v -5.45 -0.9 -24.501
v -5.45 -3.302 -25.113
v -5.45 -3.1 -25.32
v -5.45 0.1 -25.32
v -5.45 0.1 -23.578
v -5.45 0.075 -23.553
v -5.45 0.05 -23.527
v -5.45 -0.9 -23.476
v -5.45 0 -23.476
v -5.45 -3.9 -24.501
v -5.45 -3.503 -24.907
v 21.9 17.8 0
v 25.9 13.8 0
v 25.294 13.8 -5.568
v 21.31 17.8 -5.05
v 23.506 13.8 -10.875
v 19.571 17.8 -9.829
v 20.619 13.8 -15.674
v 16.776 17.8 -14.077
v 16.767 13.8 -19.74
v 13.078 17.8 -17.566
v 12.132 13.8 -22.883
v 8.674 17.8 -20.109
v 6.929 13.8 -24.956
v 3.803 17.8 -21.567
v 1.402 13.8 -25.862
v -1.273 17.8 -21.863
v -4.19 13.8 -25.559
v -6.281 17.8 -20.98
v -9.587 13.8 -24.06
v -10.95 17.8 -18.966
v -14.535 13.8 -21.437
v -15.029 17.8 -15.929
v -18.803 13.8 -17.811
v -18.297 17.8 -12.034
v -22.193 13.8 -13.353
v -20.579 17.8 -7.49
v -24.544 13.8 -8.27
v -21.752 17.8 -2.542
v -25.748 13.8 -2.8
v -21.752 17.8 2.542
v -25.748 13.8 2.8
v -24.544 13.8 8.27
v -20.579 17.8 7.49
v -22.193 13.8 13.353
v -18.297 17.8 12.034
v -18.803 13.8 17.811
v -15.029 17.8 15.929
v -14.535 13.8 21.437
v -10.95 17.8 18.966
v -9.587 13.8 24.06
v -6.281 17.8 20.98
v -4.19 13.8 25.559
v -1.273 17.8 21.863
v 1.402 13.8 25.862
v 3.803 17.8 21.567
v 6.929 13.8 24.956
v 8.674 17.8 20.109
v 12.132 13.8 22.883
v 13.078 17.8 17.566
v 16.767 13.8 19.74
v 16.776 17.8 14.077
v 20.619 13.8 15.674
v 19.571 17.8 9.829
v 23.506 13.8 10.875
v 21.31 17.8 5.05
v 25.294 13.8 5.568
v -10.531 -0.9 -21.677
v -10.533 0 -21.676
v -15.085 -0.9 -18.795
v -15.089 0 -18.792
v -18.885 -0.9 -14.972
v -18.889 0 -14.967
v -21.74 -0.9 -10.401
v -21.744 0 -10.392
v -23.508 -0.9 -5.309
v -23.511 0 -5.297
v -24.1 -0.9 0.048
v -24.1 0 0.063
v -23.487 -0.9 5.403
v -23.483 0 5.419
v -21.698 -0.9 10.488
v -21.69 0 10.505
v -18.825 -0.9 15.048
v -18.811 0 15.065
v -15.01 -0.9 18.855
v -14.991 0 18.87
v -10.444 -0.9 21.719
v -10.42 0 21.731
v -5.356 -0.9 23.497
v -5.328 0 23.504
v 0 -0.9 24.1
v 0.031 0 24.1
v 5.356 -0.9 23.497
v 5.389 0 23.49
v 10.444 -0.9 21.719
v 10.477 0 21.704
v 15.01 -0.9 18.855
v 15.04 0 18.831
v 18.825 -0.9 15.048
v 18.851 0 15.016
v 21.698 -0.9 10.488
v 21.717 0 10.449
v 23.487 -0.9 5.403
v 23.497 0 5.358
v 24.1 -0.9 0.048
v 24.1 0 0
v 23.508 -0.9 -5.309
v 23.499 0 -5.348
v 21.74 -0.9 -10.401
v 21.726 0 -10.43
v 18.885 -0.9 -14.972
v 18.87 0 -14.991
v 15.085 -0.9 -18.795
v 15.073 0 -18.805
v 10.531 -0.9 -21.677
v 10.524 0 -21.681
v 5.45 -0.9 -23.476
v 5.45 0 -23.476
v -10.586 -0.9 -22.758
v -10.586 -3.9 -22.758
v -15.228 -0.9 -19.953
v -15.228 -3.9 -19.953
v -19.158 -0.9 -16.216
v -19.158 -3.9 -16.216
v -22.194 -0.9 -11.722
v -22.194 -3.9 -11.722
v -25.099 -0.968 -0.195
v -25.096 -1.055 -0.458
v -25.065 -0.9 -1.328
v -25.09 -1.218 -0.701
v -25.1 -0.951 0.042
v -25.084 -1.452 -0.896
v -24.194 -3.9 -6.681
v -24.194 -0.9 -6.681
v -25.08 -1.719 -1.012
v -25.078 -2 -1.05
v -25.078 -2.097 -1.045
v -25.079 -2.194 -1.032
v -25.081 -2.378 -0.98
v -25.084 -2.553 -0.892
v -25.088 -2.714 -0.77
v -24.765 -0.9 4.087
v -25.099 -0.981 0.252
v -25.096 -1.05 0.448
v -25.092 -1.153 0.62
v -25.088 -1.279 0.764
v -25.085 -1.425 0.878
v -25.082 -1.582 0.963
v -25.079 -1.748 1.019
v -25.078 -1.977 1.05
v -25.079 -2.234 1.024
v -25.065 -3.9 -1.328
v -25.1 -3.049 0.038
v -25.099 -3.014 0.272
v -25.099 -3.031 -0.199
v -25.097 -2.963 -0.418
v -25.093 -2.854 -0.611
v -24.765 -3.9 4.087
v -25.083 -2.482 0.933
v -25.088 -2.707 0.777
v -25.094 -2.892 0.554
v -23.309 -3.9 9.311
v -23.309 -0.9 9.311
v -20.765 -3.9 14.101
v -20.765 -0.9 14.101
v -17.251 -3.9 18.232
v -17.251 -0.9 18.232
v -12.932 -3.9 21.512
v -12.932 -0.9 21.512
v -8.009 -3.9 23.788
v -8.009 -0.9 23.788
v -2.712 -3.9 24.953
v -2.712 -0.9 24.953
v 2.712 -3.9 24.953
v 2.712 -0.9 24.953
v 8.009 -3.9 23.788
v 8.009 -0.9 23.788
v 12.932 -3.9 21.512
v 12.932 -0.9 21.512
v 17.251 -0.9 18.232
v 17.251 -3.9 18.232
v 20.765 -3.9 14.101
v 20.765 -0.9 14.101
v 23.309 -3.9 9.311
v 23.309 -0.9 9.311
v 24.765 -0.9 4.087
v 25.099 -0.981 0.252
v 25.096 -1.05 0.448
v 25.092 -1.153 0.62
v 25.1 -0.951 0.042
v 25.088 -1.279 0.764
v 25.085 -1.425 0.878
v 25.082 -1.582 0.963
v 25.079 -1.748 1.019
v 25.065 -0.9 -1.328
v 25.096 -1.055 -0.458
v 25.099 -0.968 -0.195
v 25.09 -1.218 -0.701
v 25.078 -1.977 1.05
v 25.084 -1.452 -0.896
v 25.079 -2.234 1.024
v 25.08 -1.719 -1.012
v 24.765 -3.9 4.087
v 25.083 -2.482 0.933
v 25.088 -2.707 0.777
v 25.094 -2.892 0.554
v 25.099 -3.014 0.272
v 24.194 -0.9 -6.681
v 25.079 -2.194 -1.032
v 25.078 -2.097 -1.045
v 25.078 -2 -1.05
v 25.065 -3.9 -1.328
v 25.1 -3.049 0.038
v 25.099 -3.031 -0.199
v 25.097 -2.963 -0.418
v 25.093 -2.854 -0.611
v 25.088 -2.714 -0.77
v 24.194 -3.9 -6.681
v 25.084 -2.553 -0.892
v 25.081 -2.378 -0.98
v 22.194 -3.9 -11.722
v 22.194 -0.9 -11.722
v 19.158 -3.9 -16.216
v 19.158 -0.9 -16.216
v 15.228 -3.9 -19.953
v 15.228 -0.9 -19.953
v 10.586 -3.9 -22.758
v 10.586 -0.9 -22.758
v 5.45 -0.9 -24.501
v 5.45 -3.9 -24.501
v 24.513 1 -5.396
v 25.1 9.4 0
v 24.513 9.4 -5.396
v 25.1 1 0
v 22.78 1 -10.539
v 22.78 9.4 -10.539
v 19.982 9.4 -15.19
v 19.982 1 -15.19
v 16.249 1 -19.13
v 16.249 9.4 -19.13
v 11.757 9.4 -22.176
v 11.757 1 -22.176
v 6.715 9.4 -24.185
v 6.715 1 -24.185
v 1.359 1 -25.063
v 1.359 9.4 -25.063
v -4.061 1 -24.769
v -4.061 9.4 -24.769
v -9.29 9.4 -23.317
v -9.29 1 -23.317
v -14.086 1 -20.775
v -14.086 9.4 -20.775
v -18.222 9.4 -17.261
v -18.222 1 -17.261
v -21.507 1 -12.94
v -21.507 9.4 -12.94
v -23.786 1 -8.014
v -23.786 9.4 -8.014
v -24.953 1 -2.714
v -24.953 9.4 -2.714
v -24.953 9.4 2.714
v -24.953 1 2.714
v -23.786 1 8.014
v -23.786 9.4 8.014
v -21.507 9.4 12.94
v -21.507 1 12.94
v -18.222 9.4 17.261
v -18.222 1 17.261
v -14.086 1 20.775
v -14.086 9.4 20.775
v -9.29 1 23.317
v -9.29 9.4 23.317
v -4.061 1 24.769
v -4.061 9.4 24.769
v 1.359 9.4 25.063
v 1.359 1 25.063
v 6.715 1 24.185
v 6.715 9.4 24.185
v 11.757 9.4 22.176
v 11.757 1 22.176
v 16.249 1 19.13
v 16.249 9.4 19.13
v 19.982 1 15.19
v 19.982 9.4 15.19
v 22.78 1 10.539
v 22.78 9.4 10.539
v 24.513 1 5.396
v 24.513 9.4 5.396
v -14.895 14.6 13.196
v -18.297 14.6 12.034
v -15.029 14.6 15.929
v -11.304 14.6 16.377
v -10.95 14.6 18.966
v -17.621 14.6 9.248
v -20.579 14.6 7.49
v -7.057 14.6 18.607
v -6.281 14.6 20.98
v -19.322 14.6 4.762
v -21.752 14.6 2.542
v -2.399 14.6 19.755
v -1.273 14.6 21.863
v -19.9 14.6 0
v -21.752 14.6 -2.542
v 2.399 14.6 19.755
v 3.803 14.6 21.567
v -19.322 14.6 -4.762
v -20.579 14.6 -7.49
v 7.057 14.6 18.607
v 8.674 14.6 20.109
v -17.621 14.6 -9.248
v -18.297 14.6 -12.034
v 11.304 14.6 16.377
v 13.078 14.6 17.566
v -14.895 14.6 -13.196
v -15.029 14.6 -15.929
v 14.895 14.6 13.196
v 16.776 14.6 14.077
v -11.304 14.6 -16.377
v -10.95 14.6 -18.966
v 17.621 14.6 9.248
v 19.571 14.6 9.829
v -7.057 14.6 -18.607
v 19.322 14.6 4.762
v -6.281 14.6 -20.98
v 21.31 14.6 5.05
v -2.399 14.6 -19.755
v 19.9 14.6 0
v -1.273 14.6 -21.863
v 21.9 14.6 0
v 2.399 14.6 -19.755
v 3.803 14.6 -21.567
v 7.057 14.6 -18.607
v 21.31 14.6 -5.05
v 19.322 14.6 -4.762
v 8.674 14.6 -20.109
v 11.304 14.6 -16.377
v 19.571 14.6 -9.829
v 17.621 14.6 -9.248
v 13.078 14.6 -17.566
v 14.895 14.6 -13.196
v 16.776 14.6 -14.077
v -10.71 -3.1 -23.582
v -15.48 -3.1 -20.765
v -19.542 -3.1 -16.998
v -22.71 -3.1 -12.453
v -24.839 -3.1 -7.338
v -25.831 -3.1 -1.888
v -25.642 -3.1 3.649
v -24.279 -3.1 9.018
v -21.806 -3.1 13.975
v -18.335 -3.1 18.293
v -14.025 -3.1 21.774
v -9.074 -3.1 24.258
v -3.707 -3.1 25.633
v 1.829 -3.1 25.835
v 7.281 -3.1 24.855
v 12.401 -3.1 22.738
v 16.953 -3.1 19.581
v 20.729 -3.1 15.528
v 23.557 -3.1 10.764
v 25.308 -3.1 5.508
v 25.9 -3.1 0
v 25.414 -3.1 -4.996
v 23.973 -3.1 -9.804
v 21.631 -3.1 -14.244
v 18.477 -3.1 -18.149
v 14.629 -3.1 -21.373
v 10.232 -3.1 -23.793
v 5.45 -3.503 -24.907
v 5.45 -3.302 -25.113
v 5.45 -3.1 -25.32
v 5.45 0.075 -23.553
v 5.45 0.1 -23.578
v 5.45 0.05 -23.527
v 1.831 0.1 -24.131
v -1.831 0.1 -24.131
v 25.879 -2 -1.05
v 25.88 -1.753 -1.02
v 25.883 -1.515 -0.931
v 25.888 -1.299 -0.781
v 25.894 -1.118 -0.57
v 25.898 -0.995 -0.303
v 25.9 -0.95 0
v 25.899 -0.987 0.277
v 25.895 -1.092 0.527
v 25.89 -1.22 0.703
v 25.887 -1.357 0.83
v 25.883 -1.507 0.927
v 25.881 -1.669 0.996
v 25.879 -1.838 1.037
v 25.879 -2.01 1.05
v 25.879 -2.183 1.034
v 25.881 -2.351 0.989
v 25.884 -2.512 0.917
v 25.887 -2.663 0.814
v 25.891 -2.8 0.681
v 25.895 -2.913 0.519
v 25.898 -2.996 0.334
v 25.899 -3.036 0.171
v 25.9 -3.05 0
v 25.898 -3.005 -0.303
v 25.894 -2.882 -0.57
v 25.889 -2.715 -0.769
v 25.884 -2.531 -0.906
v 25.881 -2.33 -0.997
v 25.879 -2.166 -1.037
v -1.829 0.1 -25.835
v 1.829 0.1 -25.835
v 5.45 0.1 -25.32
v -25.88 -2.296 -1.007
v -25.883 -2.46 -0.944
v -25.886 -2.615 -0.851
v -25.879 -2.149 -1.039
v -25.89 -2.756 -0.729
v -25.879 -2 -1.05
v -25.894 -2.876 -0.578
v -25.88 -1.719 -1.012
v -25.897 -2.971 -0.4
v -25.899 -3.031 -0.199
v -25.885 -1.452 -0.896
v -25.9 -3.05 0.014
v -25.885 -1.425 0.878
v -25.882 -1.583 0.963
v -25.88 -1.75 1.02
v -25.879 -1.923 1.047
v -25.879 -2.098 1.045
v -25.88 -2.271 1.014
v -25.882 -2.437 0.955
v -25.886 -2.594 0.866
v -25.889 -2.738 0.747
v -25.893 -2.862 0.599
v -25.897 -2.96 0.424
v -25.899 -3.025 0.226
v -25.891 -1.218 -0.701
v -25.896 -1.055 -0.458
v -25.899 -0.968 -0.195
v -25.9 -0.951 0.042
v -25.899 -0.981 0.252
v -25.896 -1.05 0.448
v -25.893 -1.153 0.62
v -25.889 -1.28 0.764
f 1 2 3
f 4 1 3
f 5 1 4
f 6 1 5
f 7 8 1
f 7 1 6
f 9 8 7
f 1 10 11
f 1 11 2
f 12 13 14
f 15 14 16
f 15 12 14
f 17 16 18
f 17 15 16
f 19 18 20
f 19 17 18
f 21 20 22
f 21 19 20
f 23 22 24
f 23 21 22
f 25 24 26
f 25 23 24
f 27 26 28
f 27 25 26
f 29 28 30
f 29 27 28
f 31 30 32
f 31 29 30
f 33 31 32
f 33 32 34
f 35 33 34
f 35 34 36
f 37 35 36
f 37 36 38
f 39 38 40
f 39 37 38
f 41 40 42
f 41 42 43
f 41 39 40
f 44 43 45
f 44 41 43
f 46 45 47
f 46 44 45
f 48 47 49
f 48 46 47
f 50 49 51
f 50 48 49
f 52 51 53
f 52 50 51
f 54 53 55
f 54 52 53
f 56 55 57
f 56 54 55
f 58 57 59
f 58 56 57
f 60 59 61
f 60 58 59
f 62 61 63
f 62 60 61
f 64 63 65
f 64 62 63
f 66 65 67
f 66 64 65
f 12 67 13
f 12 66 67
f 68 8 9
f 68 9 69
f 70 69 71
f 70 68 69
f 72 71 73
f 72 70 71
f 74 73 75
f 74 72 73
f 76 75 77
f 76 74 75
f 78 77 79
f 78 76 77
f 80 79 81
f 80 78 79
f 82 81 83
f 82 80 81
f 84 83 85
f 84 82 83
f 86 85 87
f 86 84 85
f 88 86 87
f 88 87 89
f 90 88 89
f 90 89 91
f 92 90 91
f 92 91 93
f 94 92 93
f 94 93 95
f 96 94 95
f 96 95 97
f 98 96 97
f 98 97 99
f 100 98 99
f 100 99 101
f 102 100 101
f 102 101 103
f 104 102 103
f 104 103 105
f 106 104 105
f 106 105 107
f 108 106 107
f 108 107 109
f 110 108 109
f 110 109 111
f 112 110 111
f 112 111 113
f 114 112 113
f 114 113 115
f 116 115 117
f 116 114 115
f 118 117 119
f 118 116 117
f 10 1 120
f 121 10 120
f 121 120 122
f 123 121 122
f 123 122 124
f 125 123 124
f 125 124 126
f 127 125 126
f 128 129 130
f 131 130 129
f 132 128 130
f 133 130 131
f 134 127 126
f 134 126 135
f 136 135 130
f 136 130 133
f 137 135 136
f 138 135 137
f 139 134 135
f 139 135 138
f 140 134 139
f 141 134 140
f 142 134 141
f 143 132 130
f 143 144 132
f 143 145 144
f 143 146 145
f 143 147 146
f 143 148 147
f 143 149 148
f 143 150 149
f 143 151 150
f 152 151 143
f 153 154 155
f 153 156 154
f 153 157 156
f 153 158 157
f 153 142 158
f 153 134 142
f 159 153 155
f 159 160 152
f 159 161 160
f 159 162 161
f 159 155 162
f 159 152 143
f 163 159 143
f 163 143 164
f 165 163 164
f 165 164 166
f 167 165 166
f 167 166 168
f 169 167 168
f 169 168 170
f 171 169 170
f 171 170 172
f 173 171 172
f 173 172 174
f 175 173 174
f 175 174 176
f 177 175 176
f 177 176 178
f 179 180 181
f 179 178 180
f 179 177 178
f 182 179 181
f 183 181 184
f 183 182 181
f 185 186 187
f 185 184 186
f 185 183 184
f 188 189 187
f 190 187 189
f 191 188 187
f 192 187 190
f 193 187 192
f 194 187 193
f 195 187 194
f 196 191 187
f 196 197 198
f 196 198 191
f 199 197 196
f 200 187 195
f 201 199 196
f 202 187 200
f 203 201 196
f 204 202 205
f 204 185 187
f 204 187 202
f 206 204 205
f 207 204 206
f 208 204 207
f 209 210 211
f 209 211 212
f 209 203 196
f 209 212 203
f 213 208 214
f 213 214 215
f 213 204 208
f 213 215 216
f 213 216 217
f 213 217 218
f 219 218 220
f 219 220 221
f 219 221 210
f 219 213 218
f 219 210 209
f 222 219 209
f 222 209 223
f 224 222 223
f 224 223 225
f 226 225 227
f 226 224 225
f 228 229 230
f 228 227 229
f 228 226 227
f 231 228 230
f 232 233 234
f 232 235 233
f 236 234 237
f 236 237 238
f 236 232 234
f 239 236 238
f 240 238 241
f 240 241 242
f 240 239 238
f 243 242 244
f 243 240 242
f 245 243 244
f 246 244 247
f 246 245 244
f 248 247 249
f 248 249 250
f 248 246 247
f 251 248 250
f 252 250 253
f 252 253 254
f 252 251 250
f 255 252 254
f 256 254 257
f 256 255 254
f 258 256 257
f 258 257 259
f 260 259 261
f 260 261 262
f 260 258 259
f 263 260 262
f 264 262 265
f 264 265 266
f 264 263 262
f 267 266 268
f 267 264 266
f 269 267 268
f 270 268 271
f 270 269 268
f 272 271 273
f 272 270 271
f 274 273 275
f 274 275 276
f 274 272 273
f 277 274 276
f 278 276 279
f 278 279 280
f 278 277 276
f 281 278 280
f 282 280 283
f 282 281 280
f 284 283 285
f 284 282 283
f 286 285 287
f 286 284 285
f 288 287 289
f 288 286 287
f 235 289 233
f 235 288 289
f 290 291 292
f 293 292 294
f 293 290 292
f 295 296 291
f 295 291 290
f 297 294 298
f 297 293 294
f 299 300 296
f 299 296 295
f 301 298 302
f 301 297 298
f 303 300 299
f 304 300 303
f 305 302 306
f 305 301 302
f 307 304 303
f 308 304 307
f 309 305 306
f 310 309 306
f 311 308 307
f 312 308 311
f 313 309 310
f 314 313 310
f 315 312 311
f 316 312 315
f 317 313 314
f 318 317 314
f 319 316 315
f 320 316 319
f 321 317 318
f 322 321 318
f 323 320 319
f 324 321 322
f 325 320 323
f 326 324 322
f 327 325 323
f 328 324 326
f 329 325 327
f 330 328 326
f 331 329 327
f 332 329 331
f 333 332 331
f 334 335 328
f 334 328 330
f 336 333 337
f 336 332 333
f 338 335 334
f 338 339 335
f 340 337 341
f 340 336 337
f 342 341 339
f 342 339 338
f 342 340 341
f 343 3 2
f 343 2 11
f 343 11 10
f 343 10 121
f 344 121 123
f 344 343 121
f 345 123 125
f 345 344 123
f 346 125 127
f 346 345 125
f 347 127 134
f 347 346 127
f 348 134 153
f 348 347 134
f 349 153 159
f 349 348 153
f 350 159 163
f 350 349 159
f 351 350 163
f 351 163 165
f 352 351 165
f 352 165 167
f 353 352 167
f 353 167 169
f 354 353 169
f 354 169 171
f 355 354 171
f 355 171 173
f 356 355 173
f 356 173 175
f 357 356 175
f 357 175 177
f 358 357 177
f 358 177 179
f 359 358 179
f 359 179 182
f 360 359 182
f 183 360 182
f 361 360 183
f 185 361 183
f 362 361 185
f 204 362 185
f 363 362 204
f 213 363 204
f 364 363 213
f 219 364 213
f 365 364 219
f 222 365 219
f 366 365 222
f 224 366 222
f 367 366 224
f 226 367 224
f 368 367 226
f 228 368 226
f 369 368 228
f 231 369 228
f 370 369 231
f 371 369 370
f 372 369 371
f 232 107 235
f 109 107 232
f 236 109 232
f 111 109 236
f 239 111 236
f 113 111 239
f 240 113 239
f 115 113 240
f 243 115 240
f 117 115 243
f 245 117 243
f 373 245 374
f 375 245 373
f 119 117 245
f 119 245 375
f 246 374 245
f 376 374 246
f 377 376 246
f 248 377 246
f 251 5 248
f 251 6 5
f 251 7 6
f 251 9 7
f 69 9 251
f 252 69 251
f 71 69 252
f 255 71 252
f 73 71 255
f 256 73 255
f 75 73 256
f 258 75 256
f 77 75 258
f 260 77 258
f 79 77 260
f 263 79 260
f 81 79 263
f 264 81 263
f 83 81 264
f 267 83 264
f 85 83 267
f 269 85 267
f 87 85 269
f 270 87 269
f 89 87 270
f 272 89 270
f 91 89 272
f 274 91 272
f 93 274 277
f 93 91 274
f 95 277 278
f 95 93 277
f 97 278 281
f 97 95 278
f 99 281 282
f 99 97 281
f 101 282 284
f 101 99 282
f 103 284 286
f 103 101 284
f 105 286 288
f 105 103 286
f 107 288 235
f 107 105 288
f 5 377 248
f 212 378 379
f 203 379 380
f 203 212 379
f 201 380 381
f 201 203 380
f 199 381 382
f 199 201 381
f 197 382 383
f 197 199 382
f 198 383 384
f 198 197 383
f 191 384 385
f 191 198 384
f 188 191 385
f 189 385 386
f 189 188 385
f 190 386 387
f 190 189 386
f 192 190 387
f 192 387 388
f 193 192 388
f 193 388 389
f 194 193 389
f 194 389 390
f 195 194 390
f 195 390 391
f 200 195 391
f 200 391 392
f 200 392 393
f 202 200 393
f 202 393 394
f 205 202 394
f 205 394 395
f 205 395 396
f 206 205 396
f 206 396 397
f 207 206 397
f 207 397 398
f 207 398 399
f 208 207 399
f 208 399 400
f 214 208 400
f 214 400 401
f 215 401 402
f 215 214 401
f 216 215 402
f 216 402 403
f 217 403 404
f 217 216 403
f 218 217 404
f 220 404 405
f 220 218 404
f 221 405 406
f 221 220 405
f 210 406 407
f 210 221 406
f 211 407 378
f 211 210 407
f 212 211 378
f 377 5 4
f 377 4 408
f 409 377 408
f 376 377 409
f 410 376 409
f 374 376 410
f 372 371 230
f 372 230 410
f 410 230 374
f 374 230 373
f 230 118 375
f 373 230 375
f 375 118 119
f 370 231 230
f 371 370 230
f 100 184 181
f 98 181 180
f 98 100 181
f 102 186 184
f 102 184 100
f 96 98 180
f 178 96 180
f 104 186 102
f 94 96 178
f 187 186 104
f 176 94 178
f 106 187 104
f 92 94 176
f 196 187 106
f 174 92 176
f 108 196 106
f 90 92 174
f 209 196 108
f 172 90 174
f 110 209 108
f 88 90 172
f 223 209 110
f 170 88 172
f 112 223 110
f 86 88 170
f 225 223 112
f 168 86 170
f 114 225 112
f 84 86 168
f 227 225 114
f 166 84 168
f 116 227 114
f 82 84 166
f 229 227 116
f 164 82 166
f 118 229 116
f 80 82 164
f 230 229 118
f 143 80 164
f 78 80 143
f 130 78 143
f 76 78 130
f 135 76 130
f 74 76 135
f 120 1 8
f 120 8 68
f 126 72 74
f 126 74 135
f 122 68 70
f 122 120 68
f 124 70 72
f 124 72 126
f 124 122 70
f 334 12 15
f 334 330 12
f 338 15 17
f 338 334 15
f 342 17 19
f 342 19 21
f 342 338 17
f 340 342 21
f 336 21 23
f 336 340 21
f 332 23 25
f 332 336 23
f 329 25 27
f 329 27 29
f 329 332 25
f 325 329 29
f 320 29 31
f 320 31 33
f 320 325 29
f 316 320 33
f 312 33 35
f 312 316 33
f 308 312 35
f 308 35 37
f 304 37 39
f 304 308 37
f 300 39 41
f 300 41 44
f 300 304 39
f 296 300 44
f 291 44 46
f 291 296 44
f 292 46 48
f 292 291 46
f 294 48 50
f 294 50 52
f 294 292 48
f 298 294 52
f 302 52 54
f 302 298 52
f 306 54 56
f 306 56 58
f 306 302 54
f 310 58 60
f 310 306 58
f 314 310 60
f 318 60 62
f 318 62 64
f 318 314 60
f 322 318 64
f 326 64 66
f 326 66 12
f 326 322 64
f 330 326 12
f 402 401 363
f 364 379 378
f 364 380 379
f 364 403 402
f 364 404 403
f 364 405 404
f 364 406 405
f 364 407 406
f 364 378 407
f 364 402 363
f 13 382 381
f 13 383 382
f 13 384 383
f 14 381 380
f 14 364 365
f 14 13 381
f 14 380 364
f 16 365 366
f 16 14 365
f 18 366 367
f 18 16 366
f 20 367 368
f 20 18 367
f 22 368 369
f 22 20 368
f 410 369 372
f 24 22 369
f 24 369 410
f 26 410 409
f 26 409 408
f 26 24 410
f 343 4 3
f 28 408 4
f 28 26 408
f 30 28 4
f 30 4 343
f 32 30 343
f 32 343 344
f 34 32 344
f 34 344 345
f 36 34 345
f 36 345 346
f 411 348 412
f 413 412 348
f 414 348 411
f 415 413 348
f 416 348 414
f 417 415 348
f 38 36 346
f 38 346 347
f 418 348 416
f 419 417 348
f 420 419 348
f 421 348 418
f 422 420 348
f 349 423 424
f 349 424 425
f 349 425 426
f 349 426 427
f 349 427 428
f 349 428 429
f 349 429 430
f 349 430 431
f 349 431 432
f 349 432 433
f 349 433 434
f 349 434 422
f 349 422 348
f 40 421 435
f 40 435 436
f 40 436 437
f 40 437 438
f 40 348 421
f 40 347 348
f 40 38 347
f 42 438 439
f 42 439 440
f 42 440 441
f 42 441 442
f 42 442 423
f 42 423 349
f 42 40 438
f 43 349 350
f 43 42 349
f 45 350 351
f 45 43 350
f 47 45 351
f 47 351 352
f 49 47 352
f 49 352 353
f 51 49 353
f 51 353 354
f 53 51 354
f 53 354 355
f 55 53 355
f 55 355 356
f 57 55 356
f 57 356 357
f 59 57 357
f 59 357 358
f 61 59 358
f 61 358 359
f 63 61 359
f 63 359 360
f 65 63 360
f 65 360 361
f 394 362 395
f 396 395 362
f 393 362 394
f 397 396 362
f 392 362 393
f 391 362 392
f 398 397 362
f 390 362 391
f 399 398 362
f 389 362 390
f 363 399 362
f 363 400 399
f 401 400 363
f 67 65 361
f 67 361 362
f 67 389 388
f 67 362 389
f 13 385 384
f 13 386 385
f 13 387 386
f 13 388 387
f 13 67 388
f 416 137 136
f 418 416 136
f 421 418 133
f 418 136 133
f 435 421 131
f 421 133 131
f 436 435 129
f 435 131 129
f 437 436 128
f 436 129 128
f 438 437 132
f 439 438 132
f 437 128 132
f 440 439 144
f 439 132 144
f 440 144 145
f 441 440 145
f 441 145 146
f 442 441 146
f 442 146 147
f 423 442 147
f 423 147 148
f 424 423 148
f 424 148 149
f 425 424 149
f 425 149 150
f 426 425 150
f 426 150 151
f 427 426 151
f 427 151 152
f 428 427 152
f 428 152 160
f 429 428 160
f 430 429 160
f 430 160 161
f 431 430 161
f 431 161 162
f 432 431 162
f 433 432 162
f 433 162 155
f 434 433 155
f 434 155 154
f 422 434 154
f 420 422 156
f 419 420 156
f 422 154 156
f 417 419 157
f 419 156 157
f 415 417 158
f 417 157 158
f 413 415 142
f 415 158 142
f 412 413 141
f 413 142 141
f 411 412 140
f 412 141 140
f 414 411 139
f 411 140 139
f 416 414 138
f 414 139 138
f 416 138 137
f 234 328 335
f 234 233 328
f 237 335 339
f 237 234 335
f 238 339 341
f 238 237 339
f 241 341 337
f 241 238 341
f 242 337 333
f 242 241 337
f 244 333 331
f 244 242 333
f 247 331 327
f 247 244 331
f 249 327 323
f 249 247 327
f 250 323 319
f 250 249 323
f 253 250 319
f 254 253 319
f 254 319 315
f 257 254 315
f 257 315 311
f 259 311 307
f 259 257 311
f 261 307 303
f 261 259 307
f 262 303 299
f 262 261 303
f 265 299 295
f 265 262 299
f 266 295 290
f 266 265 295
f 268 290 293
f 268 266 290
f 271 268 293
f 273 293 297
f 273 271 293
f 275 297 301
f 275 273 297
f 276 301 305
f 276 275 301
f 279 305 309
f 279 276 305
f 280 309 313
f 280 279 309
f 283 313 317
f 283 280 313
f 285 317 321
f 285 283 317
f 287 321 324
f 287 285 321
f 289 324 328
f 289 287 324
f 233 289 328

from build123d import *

# Parameters (mm, degrees)
SKETCH2_W               = 10.9
SKETCH2_H               = 4.3
CUT_EXTRUDE1_DEPTH      = 26.9
SKETCH3_R               = 1.05
CUT_EXTRUDE2_DEPTH      = 26.9
CUT_EXTRUDE2_DEPTH_BACK = 26.9


with BuildPart() as part:
    # Sketch1 → Revolve1 (revolve)
    with BuildSketch(Plane.XY):
        Polygon((25.1, 1), (24.1, 0), (24.1, -0.9), (25.1, -0.9), (25.1, -3.9), (25.9, -3.1), (25.9, 13.8), (21.9, 17.8), (21.9, 14.6), (19.9, 14.6), (25.1, 9.4), align=None)
    revolve(axis=Axis((0, -5, 0), (0, 1, 0)))

    # Sketch2 → Cut-Extrude1 (cut, through all)
    with BuildSketch(Plane.XY):
        with Locations((0, -2.05)):
            Rectangle(SKETCH2_W, SKETCH2_H)
    extrude(amount=-CUT_EXTRUDE1_DEPTH, mode=Mode.SUBTRACT)

    # Sketch3 → Cut-Extrude2 (cut, two sides)
    with BuildSketch(Plane(origin=(0, 0, 0), x_dir=(0, 0, -1), z_dir=(1, 0, 0))) as cut_extrude2_sk:
        with Locations((0, -2)):
            Circle(SKETCH3_R)
    extrude(amount=CUT_EXTRUDE2_DEPTH, mode=Mode.SUBTRACT)
    extrude(cut_extrude2_sk.sketch, amount=-CUT_EXTRUDE2_DEPTH_BACK, mode=Mode.SUBTRACT)


solid = part.part
